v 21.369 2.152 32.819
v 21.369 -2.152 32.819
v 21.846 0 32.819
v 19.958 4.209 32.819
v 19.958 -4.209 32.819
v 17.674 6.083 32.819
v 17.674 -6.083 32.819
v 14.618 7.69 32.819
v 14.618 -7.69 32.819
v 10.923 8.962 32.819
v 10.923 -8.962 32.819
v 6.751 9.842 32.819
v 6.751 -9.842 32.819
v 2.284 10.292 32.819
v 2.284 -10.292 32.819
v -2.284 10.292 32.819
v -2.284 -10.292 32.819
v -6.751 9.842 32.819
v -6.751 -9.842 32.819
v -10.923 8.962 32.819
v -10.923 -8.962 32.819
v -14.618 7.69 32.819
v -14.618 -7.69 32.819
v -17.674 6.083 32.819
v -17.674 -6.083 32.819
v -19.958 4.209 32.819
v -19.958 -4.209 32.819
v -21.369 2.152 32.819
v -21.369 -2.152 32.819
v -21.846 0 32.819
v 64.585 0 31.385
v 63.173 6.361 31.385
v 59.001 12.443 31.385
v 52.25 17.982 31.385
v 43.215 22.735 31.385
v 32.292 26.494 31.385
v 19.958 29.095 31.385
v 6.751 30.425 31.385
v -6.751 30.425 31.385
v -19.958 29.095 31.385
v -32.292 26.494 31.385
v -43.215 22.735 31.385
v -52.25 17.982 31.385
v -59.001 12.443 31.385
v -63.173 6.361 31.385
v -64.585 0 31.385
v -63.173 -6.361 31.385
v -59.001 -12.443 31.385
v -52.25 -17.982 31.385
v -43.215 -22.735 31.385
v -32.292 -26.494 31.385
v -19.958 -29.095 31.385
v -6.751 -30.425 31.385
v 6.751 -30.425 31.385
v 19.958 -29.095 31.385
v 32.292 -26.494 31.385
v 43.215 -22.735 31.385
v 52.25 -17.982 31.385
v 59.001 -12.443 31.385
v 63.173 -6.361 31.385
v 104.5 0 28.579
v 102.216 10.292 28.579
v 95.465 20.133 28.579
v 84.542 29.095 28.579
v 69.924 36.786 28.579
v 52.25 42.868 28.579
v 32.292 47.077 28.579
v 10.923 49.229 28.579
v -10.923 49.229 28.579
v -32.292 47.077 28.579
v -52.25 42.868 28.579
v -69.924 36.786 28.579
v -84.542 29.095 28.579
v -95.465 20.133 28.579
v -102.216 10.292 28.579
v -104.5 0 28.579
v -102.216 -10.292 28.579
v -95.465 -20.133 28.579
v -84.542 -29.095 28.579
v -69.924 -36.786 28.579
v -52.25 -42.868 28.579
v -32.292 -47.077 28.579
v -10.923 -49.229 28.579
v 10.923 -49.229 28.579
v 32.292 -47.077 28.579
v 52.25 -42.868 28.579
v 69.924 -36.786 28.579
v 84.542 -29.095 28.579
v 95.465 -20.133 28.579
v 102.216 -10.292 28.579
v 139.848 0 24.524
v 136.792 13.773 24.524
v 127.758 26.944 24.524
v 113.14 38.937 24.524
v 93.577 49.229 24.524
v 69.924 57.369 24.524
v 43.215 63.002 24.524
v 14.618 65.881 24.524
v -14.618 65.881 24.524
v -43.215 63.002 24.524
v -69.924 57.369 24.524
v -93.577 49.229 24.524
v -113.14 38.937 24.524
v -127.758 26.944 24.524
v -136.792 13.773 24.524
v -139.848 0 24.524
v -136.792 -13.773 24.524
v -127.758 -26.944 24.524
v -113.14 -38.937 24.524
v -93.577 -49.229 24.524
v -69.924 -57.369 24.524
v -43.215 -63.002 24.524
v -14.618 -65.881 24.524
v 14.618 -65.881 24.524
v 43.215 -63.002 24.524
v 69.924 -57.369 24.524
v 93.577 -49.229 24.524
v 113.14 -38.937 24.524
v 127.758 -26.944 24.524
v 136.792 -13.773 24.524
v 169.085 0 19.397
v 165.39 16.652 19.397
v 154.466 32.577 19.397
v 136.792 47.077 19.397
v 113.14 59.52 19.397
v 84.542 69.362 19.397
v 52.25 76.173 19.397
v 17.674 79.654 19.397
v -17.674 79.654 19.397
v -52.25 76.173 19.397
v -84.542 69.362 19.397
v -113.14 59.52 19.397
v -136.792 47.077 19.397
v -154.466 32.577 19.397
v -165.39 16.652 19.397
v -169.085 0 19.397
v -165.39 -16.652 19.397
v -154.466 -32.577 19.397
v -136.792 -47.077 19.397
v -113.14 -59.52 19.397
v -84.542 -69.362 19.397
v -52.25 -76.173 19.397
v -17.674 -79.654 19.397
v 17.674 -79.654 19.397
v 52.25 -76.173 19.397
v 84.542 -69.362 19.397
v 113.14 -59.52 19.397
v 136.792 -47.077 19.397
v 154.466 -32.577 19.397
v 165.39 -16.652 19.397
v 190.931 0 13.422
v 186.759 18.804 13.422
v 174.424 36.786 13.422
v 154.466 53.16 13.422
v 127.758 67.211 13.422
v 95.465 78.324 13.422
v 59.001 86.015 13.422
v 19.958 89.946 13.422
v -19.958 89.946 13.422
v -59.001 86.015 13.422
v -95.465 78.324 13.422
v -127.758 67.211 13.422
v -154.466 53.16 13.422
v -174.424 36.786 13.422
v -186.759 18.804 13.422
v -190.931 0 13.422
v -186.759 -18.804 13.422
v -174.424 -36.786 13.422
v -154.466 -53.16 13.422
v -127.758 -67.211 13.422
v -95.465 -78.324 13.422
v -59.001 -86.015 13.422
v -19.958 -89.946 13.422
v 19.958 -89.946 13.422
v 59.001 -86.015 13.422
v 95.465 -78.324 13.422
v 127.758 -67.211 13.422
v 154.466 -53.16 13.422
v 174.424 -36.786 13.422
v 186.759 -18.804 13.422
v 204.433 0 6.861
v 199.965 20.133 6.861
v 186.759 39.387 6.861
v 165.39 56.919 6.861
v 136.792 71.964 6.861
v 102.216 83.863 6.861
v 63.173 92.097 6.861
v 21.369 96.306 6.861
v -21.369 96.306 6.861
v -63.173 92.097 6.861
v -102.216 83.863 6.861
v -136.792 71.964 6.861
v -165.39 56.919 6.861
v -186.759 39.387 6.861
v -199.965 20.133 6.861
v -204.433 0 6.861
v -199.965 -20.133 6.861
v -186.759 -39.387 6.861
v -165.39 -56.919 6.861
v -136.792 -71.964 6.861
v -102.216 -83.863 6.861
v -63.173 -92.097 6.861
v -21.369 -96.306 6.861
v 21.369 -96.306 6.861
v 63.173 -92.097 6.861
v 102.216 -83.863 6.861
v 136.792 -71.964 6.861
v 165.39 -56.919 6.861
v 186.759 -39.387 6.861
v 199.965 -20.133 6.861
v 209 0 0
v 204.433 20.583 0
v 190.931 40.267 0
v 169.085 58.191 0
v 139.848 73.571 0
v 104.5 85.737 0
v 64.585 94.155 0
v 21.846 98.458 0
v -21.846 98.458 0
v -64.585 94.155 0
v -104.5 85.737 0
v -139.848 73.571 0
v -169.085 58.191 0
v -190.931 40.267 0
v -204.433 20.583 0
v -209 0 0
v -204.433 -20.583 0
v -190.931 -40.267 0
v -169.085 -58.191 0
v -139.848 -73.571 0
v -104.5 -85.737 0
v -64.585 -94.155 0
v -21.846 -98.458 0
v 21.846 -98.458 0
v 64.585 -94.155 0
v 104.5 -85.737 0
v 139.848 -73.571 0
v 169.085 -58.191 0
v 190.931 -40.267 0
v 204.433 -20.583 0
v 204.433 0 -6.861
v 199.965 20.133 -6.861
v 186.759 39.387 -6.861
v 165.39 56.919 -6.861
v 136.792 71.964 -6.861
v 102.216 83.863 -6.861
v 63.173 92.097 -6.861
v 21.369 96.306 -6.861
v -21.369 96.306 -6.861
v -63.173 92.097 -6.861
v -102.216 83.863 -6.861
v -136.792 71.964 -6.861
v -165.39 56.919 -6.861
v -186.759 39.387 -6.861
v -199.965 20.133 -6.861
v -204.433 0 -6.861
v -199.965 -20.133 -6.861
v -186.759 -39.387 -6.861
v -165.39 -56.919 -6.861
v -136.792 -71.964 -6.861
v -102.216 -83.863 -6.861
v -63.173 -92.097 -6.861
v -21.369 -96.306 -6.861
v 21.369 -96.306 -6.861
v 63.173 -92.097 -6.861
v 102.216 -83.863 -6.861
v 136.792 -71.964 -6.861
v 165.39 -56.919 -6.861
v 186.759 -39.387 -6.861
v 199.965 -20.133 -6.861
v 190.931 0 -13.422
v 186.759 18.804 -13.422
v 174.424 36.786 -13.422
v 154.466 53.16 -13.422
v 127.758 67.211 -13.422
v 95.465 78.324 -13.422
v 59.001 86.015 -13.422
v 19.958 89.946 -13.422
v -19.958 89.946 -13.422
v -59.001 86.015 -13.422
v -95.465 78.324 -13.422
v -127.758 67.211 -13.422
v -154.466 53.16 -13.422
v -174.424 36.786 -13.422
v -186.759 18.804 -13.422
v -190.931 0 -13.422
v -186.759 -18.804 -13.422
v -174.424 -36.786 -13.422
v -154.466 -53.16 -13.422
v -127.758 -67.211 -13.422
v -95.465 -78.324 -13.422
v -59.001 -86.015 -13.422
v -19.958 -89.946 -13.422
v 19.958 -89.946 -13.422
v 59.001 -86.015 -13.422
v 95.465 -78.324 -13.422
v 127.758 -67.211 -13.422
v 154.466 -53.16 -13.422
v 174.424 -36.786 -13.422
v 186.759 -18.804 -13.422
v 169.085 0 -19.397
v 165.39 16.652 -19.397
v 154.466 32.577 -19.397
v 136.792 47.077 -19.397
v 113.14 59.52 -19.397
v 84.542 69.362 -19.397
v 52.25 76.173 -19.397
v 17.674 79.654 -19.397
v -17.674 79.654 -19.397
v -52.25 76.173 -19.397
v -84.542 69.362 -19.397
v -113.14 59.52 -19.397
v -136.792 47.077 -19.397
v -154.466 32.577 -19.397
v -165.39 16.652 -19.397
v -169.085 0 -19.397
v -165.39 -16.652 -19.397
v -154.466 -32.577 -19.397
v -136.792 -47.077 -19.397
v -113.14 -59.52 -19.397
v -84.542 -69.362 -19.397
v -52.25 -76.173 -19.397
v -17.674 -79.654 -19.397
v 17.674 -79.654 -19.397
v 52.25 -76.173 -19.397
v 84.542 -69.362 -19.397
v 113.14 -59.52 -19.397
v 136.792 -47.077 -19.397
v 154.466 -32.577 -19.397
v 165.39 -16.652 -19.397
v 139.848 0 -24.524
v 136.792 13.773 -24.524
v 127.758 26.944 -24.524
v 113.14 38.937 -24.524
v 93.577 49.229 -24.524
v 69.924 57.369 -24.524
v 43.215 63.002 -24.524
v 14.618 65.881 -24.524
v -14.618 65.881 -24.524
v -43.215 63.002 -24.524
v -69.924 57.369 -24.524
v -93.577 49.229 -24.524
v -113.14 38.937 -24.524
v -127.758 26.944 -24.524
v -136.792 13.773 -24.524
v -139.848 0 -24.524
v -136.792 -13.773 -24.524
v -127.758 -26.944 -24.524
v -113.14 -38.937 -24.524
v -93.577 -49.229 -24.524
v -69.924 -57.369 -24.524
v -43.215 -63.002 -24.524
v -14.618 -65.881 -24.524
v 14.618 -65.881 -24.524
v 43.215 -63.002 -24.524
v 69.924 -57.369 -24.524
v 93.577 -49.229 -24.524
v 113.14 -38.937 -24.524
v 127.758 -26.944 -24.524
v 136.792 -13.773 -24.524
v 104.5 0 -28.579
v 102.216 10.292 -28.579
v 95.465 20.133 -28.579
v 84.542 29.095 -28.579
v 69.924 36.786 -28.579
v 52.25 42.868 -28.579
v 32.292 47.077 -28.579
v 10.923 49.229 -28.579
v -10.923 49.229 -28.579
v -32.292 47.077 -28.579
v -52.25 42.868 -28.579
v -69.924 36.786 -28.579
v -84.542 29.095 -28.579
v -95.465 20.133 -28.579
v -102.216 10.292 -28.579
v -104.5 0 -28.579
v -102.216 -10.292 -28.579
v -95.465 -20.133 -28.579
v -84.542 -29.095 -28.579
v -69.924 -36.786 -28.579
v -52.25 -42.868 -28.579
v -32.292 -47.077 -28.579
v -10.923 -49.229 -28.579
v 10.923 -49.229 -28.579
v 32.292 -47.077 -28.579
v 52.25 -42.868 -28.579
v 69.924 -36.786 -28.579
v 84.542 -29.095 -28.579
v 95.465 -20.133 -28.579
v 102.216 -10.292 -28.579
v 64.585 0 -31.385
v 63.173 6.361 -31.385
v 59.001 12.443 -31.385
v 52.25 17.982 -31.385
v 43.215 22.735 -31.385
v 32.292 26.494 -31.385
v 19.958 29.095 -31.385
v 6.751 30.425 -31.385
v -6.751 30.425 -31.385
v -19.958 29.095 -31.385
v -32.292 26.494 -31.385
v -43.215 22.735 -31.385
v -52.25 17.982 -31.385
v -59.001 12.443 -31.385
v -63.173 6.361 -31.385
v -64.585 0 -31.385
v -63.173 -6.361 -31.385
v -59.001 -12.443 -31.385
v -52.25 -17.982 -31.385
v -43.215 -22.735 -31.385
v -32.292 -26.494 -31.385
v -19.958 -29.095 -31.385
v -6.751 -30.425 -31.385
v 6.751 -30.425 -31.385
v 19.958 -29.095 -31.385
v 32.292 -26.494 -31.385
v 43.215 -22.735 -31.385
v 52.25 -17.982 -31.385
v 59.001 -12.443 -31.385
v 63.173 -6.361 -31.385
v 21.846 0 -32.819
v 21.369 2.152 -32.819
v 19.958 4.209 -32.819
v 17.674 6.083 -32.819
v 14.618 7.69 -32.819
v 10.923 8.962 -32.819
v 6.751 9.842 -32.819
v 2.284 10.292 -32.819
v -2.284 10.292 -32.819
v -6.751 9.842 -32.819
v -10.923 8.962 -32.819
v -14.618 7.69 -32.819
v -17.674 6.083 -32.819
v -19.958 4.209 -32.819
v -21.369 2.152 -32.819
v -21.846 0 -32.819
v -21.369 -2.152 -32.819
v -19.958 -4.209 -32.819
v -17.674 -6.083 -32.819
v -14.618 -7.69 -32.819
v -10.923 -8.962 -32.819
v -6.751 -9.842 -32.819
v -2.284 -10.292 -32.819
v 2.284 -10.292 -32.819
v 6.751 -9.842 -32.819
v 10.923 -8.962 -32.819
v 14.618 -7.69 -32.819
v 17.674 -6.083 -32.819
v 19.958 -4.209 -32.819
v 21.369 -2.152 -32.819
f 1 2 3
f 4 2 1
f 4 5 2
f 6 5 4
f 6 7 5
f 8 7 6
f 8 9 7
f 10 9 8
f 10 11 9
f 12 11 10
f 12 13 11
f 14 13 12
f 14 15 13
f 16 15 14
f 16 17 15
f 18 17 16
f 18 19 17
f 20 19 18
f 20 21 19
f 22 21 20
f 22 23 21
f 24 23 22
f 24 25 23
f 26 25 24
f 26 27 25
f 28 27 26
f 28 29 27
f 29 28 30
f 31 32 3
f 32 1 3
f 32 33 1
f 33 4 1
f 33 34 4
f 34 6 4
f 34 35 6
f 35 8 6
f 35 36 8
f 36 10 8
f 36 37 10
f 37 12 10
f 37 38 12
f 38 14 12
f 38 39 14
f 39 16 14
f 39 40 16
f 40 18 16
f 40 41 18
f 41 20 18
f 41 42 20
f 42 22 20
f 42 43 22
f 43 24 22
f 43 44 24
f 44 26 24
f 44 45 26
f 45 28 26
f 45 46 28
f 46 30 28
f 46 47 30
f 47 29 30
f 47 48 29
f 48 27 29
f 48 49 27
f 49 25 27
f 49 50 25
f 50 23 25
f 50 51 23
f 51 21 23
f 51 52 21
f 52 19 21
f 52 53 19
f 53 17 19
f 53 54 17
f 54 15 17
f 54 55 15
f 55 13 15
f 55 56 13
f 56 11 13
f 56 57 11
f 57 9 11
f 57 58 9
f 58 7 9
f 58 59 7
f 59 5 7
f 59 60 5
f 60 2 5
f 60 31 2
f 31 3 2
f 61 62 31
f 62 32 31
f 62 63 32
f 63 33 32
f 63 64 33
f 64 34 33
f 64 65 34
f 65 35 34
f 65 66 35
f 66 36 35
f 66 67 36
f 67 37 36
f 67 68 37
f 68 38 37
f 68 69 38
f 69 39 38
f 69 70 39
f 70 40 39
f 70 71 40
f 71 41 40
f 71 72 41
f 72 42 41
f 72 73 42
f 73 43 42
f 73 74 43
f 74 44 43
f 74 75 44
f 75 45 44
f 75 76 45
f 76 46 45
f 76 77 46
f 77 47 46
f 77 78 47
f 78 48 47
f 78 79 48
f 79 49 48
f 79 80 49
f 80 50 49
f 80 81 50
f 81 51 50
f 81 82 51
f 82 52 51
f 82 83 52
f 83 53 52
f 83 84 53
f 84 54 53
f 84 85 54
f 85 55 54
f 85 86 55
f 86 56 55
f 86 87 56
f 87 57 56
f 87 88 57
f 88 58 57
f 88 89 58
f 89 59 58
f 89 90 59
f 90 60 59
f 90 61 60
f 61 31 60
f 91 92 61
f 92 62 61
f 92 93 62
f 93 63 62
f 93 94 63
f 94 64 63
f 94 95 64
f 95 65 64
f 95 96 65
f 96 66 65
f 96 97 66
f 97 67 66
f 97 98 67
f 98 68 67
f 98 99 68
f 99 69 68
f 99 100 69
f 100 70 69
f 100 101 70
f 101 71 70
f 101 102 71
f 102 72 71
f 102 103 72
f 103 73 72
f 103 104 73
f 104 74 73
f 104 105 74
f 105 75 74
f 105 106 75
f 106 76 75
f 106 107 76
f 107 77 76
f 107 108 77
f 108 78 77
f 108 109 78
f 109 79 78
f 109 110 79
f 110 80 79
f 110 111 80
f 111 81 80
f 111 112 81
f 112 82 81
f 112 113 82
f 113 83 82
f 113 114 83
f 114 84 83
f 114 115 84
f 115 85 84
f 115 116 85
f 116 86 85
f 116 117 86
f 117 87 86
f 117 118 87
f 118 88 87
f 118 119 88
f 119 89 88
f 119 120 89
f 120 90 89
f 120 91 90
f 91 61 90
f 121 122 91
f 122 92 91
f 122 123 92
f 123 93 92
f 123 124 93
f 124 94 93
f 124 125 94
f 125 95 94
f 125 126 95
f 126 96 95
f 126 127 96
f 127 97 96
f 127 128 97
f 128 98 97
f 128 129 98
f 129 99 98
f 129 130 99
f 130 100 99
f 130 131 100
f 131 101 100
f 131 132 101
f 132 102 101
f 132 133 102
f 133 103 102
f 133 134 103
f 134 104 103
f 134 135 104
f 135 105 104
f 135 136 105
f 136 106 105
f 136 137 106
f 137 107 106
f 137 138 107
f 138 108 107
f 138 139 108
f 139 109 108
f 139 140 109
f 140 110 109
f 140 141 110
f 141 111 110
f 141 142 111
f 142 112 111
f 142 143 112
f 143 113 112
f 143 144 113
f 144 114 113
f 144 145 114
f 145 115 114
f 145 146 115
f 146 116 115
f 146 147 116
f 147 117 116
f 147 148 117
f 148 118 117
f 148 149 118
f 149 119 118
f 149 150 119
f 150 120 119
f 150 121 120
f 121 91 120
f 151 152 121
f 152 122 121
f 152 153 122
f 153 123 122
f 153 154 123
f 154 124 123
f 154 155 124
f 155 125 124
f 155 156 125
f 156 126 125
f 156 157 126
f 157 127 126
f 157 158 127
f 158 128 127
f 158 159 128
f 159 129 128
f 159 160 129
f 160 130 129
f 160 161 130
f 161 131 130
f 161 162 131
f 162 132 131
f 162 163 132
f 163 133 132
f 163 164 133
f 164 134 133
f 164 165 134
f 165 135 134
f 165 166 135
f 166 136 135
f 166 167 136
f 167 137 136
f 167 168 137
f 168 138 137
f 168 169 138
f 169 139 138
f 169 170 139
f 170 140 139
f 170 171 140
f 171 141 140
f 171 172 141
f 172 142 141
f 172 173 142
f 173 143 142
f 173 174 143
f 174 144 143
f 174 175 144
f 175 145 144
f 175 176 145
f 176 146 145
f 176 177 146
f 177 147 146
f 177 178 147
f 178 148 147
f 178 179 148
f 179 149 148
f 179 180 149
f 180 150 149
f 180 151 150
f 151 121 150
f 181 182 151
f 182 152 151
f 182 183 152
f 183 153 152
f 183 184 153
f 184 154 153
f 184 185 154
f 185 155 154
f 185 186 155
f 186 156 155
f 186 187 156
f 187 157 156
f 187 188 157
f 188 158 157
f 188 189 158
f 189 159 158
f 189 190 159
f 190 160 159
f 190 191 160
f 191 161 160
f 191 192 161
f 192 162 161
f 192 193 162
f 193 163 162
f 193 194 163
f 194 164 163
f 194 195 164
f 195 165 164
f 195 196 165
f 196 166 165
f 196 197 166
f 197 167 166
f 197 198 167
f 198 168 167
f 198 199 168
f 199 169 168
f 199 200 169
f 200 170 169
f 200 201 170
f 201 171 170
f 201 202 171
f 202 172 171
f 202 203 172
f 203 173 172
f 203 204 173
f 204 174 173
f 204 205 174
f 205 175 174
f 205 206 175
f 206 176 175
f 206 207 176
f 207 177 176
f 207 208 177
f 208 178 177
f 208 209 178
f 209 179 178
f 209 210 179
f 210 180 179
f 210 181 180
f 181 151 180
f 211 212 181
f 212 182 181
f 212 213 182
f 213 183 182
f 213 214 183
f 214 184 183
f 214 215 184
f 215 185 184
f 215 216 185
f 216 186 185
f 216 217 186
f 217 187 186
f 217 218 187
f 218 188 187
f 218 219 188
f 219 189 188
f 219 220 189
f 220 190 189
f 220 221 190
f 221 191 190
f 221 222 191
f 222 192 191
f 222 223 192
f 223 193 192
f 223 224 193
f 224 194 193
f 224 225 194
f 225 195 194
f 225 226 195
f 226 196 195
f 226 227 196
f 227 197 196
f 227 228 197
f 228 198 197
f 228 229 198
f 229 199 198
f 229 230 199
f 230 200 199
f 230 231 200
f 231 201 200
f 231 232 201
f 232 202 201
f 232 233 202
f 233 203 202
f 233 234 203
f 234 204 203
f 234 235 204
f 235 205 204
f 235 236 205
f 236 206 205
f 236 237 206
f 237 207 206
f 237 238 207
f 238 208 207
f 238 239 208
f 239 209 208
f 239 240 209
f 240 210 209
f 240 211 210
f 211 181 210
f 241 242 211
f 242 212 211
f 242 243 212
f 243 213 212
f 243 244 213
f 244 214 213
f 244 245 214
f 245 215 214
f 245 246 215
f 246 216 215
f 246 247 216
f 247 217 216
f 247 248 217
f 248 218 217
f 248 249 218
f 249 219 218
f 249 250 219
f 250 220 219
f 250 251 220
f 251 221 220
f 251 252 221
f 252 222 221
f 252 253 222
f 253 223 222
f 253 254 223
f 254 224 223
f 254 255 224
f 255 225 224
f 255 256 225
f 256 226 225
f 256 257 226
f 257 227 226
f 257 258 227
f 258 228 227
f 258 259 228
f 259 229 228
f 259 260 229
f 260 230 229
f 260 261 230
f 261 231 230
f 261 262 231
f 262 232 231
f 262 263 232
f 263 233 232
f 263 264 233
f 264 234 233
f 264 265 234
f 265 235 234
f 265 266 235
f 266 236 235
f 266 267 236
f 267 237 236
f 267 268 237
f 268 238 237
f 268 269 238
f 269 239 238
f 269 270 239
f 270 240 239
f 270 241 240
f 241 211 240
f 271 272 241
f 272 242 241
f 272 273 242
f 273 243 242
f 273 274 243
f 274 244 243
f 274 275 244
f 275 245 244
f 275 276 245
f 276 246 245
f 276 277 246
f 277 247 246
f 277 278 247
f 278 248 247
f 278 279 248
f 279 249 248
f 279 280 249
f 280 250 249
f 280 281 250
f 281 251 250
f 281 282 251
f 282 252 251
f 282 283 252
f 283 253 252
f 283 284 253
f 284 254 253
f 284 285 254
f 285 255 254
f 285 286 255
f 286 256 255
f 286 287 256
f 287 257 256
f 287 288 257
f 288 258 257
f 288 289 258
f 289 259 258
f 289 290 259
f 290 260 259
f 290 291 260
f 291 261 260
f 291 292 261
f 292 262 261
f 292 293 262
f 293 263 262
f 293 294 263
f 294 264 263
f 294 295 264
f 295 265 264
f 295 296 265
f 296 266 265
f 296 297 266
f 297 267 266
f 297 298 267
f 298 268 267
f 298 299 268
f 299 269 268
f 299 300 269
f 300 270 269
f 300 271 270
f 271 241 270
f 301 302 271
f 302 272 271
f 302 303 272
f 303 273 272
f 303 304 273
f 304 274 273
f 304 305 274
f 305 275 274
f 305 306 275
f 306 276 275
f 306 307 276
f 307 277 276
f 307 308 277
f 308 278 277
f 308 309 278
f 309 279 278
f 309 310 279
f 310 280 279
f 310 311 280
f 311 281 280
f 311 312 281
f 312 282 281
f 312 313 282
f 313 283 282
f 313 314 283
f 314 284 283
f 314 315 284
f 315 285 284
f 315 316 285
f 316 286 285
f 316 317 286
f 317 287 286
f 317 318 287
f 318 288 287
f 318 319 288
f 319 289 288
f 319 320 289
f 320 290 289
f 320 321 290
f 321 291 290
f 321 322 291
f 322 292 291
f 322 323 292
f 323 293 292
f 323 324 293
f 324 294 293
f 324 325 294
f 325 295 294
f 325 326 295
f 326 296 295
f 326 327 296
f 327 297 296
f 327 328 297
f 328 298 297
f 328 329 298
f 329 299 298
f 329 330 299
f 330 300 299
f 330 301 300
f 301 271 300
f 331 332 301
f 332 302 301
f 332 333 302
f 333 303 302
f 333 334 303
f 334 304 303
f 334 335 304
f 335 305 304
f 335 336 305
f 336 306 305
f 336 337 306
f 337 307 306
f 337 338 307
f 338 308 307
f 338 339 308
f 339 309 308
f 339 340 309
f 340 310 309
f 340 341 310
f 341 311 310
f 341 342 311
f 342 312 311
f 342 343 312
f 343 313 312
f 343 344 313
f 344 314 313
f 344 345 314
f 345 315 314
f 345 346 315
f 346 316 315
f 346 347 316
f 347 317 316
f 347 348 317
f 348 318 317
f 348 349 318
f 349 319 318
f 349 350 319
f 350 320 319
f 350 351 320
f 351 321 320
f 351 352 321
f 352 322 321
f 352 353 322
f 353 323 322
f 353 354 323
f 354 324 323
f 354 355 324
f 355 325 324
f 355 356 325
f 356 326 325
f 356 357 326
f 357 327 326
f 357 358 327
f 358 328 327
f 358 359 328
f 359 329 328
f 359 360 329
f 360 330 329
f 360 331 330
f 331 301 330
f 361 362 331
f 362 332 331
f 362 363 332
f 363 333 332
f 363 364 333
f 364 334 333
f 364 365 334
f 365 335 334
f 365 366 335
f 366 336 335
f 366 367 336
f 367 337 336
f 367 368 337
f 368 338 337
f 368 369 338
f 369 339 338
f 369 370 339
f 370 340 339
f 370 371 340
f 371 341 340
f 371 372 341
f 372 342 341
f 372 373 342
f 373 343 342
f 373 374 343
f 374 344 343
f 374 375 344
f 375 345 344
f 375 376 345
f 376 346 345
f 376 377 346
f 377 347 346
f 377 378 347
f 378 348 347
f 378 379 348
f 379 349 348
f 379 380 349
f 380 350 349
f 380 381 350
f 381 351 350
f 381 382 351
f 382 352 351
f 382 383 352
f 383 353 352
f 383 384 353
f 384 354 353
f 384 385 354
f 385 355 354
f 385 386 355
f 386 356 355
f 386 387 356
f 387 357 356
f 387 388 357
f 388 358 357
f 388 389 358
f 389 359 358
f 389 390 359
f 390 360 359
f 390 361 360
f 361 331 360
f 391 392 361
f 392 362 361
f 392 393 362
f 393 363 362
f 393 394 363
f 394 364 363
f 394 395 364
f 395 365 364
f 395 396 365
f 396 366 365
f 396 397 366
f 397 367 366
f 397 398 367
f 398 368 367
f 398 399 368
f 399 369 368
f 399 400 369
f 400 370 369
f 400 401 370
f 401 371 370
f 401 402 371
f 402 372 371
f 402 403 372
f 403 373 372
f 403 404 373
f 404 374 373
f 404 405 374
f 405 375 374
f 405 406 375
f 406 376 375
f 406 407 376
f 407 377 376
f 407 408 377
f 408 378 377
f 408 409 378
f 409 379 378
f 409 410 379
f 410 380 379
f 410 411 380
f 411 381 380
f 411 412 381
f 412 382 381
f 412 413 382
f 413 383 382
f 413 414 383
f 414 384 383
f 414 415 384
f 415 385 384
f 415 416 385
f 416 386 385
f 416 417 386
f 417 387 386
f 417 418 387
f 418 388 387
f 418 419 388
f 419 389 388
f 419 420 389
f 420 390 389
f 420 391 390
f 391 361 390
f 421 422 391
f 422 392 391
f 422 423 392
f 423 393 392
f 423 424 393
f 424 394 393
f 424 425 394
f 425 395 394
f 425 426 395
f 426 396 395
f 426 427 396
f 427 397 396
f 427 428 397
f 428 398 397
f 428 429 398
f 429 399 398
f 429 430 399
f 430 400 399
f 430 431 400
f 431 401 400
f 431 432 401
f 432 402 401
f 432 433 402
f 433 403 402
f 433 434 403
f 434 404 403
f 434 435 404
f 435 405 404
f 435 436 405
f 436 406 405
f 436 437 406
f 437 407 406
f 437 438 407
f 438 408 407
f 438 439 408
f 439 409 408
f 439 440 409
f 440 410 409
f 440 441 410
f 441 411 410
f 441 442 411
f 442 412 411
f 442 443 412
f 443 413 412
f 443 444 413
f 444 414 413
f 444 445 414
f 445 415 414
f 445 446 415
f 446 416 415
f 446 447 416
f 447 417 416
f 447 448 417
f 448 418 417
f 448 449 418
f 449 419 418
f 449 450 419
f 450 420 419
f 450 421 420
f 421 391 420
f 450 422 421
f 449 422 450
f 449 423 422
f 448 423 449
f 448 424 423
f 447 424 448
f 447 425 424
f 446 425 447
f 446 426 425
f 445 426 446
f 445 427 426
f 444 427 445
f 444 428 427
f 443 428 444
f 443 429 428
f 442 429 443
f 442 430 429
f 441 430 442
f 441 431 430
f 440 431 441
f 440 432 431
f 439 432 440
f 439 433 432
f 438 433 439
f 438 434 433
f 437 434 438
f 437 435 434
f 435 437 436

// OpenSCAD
// Generated by SolidPython 1.0.1 on 2020-07-29 00:46:53


scale(v = [19, 9, 3]) {
	sphere(r = 11);
}
/***********************************************
*********      SolidPython code:      **********
************************************************
 
# import packages: SolidPython
from solid import *
from solid.utils import *
from itertools import chain, combinations, permutations


class Resize:

    def __init__(self, scad_file):
        self.scad_file = scad_file
        #self.scad_file = import_scad(scad_file)
        # cone/cylinder param:
        self.r1 = 0
        self.r2 = 0
        self.h = 0
        # rectangular prism param:
        self.w = 0
        self.l = 0
        # ellipse param:
        self.r = 0

    # import OpenScad code (file name corresponds to shape)


    # classify shape + parameters
    def assign(self, param1, param2, param3):
        if self.scad_file == 'cone.scad':
            self.r1 = param1
            self.r2 = param2
            self.h = param3
        elif self.scad_file == 'cylinder.scad':
            self.r1 = param1
            self.r2 = param2
            self.h = param3
        elif self.scad_file == 'rectangularPrism.scad':
            self.h = param1
            self.l = param2
            self.w = param3
        else:
            self.r = param1
            self.h = param2

    # resize parameters
    def iterate(self):
        x = range(3, 20, 2)
        i = 1
        if self.scad_file == 'cone.scad':
            tempList = list(permutations(x, 2))
            for temp in tempList:
                param1 = temp[0]
                param2 = temp[1]
                filepath = 'produced_scad_files/' + 'cone' + str(param1) + '_' + str(param2) + '_' + '.scad'
                scad_render_to_file(cylinder(h=param1, r1=param2, r2=0), filepath)

        elif self.scad_file == 'cylinder.scad':
            tempList = list(permutations(x, 3))
            for temp in tempList:
                param1 = temp[0]
                param2 = temp[1]
                filepath = 'produced_scad_files/' + 'cylinder' + str(param1) + '_' + str(param2) + '_' + '.scad'
                scad_render_to_file(cylinder(h=param1, r1=param2, r2=param2), filepath)

        elif self.scad_file == 'rectangularPrism.scad':
            tempList = list(permutations(x, 3))
            for temp in tempList:
                param1 = temp[0]
                param2 = temp[1]
                param3 = temp[2]
                filepath = 'produced_scad_files/' + 'rectangularPrism' + str(param1) + '_' + str(param2) + '_' + str(
                    param3) + '.scad'
                scad_render_to_file(cube(size=(param1, param2, param3)), filepath)

        elif self.scad_file == 'ellipse.scad':
            tempList = list(permutations(x, 4))
            for temp in tempList:
                param1 = temp[0]
                param2 = temp[1]
                param3 = temp[2]
                param4 = temp[3]
                filepath = 'produced_scad_files/' + 'ellipse' + str(param1) + '_' + str(param2) + '_' + str(param3) + '_' + str(param4) + '.scad'
                scad_render_to_file(scale([param1, param2, param3])(sphere(r=param4)), filepath)

    def render_to_scadfile(self):
        scad_render_to_file(scad, 'example.scad') 
 
************************************************/
